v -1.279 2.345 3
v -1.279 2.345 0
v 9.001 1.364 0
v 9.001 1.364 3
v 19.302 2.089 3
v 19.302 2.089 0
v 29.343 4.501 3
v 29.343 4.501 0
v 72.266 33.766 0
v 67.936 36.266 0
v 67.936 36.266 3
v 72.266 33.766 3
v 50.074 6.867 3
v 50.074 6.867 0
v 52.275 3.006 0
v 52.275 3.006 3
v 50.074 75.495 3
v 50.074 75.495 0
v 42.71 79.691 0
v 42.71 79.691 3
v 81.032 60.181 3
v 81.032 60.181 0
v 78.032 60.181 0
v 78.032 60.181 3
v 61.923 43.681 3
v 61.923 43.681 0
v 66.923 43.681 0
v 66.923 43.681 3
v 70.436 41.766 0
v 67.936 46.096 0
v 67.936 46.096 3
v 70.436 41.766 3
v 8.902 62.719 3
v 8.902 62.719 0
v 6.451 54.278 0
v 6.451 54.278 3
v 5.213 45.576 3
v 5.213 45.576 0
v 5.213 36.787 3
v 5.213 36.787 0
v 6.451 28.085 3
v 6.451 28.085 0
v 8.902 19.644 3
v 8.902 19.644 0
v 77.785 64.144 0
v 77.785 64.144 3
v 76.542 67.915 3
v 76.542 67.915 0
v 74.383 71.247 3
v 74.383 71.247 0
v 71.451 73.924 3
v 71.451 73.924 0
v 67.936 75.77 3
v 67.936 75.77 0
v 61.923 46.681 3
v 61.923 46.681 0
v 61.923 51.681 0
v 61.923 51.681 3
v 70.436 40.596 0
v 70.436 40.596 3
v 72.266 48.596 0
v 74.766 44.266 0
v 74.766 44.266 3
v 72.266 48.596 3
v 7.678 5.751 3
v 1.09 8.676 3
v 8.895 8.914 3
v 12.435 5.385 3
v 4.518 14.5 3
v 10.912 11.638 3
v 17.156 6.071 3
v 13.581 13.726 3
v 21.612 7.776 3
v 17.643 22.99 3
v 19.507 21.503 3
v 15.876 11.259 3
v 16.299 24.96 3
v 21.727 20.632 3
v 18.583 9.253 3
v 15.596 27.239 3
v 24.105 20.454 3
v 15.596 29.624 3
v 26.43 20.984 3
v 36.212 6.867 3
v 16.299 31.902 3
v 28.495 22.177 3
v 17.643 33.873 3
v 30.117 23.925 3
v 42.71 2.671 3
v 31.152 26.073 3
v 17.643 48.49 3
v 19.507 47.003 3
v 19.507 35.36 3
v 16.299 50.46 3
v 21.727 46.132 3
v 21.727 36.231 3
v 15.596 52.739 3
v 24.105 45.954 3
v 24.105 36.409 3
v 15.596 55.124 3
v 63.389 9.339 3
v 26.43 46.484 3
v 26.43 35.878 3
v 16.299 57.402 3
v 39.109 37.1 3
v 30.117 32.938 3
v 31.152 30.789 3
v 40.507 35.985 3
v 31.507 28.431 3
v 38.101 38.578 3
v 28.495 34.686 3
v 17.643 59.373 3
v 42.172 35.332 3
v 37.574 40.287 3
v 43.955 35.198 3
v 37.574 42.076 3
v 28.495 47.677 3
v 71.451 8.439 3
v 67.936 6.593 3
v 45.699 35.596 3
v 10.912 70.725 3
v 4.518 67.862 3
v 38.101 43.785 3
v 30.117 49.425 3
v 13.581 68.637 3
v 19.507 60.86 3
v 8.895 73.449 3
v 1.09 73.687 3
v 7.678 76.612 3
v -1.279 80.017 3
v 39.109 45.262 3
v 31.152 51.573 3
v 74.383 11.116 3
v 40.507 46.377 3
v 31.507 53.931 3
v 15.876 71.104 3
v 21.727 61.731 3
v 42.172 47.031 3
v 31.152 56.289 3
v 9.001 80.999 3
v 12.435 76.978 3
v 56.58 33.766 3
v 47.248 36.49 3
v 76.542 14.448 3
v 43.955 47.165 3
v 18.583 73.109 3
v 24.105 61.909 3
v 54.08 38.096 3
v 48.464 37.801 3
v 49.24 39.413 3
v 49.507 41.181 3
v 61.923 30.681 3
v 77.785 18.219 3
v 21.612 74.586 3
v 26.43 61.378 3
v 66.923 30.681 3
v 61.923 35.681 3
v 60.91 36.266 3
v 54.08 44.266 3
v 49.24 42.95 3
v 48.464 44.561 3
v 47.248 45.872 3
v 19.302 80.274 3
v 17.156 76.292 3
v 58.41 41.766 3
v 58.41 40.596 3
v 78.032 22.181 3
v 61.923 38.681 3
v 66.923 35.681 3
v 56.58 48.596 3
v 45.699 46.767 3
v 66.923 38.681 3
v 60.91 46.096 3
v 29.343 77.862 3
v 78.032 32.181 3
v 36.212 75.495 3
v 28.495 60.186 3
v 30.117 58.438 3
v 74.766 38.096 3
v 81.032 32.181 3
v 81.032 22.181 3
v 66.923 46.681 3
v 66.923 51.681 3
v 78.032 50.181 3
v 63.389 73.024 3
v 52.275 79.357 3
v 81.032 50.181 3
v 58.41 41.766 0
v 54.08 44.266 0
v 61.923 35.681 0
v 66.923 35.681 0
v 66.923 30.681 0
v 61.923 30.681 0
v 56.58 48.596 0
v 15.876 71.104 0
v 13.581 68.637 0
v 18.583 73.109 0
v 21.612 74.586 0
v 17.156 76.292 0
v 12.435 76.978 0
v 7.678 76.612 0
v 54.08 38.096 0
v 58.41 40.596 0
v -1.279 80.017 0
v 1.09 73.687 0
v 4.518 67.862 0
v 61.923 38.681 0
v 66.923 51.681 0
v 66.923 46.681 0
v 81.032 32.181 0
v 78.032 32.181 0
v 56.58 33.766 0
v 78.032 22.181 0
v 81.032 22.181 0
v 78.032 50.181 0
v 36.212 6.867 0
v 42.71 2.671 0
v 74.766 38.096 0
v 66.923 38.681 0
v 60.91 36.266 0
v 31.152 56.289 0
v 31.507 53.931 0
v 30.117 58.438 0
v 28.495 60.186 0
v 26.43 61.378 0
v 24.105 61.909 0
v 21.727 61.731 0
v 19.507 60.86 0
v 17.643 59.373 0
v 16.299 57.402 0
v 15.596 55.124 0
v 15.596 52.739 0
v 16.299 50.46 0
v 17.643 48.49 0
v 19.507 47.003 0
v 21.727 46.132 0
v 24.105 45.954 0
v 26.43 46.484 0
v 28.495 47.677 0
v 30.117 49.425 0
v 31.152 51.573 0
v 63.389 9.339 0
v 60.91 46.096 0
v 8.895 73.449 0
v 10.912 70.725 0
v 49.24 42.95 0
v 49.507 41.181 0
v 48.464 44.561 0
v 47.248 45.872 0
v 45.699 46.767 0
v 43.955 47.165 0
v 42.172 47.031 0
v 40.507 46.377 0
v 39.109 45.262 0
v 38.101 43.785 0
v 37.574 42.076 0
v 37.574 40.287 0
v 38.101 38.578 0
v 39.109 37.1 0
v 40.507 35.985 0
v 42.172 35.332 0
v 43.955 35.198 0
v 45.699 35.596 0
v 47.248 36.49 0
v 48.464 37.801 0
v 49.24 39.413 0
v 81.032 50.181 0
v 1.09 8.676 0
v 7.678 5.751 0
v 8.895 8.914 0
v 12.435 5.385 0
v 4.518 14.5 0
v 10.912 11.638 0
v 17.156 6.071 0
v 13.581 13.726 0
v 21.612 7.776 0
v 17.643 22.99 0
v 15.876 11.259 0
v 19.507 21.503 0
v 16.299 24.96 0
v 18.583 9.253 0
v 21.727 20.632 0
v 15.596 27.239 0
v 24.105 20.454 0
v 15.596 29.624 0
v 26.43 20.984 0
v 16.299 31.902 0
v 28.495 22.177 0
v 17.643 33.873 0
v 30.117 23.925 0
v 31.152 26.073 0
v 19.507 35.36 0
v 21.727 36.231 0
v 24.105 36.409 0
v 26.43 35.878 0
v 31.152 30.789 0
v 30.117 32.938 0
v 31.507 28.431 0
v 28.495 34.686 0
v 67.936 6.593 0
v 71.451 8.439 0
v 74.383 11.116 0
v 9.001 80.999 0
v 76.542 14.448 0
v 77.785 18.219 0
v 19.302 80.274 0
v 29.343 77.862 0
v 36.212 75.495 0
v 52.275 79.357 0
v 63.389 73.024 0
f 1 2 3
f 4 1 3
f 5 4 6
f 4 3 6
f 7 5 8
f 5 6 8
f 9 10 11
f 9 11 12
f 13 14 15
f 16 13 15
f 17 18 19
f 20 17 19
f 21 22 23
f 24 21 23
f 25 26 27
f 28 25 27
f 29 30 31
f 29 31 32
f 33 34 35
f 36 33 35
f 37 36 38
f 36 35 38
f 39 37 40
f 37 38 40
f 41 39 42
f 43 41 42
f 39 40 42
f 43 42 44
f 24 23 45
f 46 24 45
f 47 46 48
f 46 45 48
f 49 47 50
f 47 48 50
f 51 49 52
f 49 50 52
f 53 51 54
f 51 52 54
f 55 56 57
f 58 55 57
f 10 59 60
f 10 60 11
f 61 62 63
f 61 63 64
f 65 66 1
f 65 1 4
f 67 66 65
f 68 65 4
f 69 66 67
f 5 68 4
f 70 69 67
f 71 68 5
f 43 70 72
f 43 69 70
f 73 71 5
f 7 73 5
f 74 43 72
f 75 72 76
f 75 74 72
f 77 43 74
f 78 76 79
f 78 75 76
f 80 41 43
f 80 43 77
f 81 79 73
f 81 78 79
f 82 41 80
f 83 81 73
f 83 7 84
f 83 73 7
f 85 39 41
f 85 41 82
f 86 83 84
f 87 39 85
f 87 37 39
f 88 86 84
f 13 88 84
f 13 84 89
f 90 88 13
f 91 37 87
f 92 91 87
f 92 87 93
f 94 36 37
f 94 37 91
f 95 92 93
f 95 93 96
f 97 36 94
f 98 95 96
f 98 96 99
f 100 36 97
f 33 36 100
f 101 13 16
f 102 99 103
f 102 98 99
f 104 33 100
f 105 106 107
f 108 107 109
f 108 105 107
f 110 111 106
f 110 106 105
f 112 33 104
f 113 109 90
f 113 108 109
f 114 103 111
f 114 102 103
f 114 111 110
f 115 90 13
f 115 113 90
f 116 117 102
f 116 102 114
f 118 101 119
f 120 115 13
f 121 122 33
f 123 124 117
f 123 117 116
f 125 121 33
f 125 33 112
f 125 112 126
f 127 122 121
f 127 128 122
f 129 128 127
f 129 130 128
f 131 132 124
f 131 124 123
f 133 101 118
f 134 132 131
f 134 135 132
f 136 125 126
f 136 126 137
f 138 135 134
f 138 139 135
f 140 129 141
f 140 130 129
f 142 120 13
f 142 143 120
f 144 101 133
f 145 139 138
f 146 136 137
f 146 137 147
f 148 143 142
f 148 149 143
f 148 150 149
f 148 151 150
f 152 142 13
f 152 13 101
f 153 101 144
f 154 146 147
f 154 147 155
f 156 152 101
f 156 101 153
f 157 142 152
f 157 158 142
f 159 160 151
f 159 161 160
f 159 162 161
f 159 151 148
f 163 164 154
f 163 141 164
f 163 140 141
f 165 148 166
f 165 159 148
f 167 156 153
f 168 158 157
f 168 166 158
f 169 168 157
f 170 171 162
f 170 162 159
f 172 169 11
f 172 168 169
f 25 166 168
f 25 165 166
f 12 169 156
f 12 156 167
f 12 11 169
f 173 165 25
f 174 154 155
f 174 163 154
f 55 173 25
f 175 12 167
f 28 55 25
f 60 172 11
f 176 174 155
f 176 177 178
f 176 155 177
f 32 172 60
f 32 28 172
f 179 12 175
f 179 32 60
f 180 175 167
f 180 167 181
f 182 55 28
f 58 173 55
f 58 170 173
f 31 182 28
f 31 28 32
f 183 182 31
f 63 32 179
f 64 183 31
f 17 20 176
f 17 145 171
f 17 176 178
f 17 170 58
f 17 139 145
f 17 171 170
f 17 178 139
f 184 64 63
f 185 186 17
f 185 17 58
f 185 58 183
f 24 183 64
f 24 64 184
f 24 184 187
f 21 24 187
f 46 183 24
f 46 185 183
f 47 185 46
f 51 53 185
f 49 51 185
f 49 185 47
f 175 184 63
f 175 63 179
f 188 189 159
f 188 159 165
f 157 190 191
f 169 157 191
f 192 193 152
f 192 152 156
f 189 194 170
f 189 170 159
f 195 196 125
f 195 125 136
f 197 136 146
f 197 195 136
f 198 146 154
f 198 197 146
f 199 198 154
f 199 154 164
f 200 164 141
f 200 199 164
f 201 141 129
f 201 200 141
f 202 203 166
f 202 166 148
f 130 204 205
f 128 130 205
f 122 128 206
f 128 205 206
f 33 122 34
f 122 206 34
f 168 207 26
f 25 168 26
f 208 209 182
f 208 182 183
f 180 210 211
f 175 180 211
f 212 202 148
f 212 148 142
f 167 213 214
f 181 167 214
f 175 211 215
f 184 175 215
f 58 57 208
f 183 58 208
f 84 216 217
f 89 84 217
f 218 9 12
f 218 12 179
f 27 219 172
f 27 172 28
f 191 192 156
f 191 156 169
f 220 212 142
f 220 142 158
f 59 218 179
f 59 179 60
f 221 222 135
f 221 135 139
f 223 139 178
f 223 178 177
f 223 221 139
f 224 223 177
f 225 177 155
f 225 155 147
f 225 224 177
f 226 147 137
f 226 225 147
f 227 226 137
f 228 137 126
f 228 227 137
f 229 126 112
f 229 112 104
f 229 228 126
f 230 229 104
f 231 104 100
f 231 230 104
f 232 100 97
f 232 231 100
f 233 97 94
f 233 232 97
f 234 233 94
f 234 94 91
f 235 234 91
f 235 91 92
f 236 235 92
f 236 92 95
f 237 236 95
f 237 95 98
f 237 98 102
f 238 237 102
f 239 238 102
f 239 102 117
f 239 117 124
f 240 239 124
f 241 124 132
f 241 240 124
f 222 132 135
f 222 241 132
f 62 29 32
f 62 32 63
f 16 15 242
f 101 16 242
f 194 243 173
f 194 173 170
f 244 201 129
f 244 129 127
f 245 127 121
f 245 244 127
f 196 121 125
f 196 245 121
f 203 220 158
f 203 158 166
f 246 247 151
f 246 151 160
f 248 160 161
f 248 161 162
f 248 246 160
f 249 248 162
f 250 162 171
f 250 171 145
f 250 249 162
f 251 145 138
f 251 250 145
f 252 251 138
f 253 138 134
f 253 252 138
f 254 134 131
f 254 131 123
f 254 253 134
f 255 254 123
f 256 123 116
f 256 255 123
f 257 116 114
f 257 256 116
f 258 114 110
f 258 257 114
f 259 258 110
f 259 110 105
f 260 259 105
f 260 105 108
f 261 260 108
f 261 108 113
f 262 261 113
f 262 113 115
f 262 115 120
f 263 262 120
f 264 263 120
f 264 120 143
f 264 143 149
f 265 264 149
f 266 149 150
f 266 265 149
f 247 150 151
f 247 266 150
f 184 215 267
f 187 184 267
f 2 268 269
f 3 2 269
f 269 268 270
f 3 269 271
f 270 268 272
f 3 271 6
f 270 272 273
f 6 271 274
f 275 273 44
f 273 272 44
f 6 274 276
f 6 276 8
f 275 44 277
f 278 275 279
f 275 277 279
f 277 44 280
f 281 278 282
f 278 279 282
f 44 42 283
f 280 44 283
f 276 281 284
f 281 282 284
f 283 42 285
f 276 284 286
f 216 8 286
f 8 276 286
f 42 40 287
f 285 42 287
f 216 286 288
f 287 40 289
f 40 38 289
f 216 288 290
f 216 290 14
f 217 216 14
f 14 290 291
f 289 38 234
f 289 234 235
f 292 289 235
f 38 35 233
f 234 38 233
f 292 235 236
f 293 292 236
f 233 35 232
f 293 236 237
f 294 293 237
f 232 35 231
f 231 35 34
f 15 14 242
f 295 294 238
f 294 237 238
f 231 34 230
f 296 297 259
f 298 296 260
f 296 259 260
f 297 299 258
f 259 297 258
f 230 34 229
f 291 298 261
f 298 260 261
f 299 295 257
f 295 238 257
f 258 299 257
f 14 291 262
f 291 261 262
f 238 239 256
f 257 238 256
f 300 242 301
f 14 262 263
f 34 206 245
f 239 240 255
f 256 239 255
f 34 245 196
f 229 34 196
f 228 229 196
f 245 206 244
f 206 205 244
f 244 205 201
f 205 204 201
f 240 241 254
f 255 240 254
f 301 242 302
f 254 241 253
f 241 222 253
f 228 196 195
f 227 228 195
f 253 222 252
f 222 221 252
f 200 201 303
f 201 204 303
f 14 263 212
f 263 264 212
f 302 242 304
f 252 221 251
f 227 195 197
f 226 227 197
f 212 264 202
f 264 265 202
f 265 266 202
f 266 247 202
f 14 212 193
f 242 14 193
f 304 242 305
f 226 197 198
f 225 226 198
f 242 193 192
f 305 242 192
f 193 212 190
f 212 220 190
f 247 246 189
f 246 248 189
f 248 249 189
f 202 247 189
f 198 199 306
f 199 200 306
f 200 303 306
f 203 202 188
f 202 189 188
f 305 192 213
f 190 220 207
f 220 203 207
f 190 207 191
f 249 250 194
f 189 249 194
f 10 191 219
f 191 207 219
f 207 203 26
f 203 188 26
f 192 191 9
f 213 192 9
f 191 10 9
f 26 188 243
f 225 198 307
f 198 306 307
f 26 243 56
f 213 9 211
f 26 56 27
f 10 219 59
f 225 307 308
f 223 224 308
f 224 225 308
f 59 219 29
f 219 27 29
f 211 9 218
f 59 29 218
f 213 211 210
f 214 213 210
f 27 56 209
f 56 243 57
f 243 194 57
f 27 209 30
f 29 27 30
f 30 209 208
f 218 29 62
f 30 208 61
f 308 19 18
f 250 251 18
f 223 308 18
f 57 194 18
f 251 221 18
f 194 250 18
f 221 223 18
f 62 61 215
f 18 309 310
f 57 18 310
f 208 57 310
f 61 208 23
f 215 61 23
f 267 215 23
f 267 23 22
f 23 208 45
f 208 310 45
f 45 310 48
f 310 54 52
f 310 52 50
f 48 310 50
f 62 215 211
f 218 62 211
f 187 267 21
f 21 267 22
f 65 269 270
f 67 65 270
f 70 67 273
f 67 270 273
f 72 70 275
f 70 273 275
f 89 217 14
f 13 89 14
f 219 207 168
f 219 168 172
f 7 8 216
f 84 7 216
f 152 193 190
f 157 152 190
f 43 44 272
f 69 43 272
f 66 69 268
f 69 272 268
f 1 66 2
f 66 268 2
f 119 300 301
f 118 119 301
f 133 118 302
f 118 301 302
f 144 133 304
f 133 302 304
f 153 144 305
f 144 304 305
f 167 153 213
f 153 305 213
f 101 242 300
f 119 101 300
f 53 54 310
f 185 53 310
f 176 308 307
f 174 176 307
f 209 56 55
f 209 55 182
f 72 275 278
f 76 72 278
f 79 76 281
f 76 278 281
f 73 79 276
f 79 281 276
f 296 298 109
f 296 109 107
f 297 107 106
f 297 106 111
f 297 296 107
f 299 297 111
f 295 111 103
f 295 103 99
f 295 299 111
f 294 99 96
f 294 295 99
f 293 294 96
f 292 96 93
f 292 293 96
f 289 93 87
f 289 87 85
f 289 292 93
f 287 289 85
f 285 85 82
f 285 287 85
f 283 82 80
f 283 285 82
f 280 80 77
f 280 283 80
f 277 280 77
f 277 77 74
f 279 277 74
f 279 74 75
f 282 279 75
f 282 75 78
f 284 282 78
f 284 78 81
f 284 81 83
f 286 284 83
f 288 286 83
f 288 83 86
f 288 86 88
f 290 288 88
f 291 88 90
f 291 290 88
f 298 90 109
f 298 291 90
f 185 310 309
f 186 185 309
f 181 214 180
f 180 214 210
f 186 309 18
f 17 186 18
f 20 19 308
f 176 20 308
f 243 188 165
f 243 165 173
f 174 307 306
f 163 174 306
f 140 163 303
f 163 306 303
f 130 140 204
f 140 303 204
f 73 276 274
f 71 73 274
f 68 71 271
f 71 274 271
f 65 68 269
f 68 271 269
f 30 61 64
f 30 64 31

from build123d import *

# Parameters (mm, degrees)
SKETCH2_R           = 8
SKETCH2_R_2         = 6
SKETCH2_W           = 5
SKETCH2_H           = 5
BOSS_EXTRUDE1_DEPTH = 3


with BuildPart() as part:
    # Sketch2 → Boss-Extrude1 (new body)
    with BuildSketch(Plane.XY):
        with BuildLine():
            Line((81.032103119, 50.181312), (81.032103119, 60.181312))
            Line((81.032103119, 60.181312), (78.032103119, 60.181312))
            ThreePointArc((78.032103119, 60.181312), (75.569321499, 69.649967364), (67.936161846, 75.770065518))
            Line((67.936161846, 75.770065518), (63.389132962, 73.023833254))
            Line((63.389132962, 73.023833254), (52.27464227, 79.356930255))
            Line((52.27464227, 79.356930255), (50.074247047, 75.495269488))
            Line((50.074247047, 75.495269488), (42.709956252, 79.691482274))
            Line((42.709956252, 79.691482274), (36.212476018, 75.495269488))
            Line((36.212476018, 75.495269488), (29.342622159, 77.861804263))
            ThreePointArc((29.342622159, 77.861804263), (14.166162437, 80.849682425), (-1.279201176, 80.017163065))
            ThreePointArc((-1.279201176, 80.017163065), (2.677054283, 70.700200378), (8.902417187, 62.718809041))
            ThreePointArc((8.902417187, 62.718809041), (5.05730693, 41.181312), (8.902417187, 19.643814959))
            ThreePointArc((8.902417187, 19.643814959), (2.677054283, 11.662423622), (-1.279201176, 2.345460935))
            ThreePointArc((-1.279201176, 2.345460935), (14.166162437, 1.512941575), (29.342622159, 4.500819737))
            Line((29.342622159, 4.500819737), (36.212476018, 6.867354512))
            Line((36.212476018, 6.867354512), (42.709956252, 2.671141726))
            Line((42.709956252, 2.671141726), (50.074247047, 6.867354512))
            Line((50.074247047, 6.867354512), (52.27464227, 3.005693745))
            Line((52.27464227, 3.005693745), (63.389132962, 9.338790746))
            Line((63.389132962, 9.338790746), (67.936161846, 6.592558482))
            ThreePointArc((67.936161846, 6.592558482), (75.569321499, 12.712656636), (78.032103119, 22.181312))
            Line((78.032103119, 22.181312), (81.032103119, 22.181312))
            Line((81.032103119, 22.181312), (81.032103119, 32.181312))
            Line((81.032103119, 32.181312), (78.032103119, 32.181312))
            Line((78.032103119, 32.181312), (78.032103119, 50.181312))
            Line((78.032103119, 50.181312), (81.032103119, 50.181312))
        make_face()
        with Locations((23.507028058, 53.931312)):
            Circle(SKETCH2_R, mode=Mode.SUBTRACT)
        with Locations((43.507028058, 41.181312)):
            Circle(SKETCH2_R_2, mode=Mode.SUBTRACT)
        with Locations((23.507028058, 28.431312)):
            Circle(SKETCH2_R, mode=Mode.SUBTRACT)
        with Locations((64.423022125, 41.181312)):
            Rectangle(SKETCH2_W, SKETCH2_H, mode=Mode.SUBTRACT)
        with Locations((64.423022125, 33.181312)):
            Rectangle(SKETCH2_W, SKETCH2_H, mode=Mode.SUBTRACT)
        Polygon((72.266288865, 48.59637551), (67.936161846, 46.09637551), (70.436161846, 41.766248491), (74.766288865, 44.266248491), align=None, mode=Mode.SUBTRACT)
        Polygon((67.936161846, 36.266248491), (72.266288865, 33.766248491), (74.766288865, 38.09637551), (70.436161846, 40.596375509), align=None, mode=Mode.SUBTRACT)
        with Locations((64.423022125, 49.181312)):
            Rectangle(SKETCH2_W, SKETCH2_H, mode=Mode.SUBTRACT)
        Polygon((56.579755385, 33.766248491), (60.909882404, 36.266248491), (58.409882404, 40.59637551), (54.079755385, 38.09637551), align=None, mode=Mode.SUBTRACT)
        Polygon((60.909882404, 46.09637551), (56.579755385, 48.596375509), (54.079755385, 44.266248491), (58.409882404, 41.766248491), align=None, mode=Mode.SUBTRACT)
        with BuildLine():
            ThreePointArc((21.611730632, 74.586477389), (14.814545044, 76.765459524), (7.678288301, 76.612049032))
            ThreePointArc((7.678288301, 76.612049032), (9.811410227, 72.018941841), (13.580912618, 68.636975763))
            ThreePointArc((13.580912618, 68.636975763), (17.183726984, 72.168659356), (21.611730632, 74.586477389))
        make_face(mode=Mode.SUBTRACT)
        with BuildLine():
            ThreePointArc((7.678288301, 5.750574968), (9.811410227, 10.343682159), (13.580912618, 13.725648237))
            ThreePointArc((13.580912618, 13.725648237), (17.183726984, 10.193964644), (21.611730632, 7.776146611))
            ThreePointArc((21.611730632, 7.776146611), (14.814545044, 5.597164476), (7.678288301, 5.750574968))
        make_face(mode=Mode.SUBTRACT)
    extrude(amount=BOSS_EXTRUDE1_DEPTH)


solid = part.part
